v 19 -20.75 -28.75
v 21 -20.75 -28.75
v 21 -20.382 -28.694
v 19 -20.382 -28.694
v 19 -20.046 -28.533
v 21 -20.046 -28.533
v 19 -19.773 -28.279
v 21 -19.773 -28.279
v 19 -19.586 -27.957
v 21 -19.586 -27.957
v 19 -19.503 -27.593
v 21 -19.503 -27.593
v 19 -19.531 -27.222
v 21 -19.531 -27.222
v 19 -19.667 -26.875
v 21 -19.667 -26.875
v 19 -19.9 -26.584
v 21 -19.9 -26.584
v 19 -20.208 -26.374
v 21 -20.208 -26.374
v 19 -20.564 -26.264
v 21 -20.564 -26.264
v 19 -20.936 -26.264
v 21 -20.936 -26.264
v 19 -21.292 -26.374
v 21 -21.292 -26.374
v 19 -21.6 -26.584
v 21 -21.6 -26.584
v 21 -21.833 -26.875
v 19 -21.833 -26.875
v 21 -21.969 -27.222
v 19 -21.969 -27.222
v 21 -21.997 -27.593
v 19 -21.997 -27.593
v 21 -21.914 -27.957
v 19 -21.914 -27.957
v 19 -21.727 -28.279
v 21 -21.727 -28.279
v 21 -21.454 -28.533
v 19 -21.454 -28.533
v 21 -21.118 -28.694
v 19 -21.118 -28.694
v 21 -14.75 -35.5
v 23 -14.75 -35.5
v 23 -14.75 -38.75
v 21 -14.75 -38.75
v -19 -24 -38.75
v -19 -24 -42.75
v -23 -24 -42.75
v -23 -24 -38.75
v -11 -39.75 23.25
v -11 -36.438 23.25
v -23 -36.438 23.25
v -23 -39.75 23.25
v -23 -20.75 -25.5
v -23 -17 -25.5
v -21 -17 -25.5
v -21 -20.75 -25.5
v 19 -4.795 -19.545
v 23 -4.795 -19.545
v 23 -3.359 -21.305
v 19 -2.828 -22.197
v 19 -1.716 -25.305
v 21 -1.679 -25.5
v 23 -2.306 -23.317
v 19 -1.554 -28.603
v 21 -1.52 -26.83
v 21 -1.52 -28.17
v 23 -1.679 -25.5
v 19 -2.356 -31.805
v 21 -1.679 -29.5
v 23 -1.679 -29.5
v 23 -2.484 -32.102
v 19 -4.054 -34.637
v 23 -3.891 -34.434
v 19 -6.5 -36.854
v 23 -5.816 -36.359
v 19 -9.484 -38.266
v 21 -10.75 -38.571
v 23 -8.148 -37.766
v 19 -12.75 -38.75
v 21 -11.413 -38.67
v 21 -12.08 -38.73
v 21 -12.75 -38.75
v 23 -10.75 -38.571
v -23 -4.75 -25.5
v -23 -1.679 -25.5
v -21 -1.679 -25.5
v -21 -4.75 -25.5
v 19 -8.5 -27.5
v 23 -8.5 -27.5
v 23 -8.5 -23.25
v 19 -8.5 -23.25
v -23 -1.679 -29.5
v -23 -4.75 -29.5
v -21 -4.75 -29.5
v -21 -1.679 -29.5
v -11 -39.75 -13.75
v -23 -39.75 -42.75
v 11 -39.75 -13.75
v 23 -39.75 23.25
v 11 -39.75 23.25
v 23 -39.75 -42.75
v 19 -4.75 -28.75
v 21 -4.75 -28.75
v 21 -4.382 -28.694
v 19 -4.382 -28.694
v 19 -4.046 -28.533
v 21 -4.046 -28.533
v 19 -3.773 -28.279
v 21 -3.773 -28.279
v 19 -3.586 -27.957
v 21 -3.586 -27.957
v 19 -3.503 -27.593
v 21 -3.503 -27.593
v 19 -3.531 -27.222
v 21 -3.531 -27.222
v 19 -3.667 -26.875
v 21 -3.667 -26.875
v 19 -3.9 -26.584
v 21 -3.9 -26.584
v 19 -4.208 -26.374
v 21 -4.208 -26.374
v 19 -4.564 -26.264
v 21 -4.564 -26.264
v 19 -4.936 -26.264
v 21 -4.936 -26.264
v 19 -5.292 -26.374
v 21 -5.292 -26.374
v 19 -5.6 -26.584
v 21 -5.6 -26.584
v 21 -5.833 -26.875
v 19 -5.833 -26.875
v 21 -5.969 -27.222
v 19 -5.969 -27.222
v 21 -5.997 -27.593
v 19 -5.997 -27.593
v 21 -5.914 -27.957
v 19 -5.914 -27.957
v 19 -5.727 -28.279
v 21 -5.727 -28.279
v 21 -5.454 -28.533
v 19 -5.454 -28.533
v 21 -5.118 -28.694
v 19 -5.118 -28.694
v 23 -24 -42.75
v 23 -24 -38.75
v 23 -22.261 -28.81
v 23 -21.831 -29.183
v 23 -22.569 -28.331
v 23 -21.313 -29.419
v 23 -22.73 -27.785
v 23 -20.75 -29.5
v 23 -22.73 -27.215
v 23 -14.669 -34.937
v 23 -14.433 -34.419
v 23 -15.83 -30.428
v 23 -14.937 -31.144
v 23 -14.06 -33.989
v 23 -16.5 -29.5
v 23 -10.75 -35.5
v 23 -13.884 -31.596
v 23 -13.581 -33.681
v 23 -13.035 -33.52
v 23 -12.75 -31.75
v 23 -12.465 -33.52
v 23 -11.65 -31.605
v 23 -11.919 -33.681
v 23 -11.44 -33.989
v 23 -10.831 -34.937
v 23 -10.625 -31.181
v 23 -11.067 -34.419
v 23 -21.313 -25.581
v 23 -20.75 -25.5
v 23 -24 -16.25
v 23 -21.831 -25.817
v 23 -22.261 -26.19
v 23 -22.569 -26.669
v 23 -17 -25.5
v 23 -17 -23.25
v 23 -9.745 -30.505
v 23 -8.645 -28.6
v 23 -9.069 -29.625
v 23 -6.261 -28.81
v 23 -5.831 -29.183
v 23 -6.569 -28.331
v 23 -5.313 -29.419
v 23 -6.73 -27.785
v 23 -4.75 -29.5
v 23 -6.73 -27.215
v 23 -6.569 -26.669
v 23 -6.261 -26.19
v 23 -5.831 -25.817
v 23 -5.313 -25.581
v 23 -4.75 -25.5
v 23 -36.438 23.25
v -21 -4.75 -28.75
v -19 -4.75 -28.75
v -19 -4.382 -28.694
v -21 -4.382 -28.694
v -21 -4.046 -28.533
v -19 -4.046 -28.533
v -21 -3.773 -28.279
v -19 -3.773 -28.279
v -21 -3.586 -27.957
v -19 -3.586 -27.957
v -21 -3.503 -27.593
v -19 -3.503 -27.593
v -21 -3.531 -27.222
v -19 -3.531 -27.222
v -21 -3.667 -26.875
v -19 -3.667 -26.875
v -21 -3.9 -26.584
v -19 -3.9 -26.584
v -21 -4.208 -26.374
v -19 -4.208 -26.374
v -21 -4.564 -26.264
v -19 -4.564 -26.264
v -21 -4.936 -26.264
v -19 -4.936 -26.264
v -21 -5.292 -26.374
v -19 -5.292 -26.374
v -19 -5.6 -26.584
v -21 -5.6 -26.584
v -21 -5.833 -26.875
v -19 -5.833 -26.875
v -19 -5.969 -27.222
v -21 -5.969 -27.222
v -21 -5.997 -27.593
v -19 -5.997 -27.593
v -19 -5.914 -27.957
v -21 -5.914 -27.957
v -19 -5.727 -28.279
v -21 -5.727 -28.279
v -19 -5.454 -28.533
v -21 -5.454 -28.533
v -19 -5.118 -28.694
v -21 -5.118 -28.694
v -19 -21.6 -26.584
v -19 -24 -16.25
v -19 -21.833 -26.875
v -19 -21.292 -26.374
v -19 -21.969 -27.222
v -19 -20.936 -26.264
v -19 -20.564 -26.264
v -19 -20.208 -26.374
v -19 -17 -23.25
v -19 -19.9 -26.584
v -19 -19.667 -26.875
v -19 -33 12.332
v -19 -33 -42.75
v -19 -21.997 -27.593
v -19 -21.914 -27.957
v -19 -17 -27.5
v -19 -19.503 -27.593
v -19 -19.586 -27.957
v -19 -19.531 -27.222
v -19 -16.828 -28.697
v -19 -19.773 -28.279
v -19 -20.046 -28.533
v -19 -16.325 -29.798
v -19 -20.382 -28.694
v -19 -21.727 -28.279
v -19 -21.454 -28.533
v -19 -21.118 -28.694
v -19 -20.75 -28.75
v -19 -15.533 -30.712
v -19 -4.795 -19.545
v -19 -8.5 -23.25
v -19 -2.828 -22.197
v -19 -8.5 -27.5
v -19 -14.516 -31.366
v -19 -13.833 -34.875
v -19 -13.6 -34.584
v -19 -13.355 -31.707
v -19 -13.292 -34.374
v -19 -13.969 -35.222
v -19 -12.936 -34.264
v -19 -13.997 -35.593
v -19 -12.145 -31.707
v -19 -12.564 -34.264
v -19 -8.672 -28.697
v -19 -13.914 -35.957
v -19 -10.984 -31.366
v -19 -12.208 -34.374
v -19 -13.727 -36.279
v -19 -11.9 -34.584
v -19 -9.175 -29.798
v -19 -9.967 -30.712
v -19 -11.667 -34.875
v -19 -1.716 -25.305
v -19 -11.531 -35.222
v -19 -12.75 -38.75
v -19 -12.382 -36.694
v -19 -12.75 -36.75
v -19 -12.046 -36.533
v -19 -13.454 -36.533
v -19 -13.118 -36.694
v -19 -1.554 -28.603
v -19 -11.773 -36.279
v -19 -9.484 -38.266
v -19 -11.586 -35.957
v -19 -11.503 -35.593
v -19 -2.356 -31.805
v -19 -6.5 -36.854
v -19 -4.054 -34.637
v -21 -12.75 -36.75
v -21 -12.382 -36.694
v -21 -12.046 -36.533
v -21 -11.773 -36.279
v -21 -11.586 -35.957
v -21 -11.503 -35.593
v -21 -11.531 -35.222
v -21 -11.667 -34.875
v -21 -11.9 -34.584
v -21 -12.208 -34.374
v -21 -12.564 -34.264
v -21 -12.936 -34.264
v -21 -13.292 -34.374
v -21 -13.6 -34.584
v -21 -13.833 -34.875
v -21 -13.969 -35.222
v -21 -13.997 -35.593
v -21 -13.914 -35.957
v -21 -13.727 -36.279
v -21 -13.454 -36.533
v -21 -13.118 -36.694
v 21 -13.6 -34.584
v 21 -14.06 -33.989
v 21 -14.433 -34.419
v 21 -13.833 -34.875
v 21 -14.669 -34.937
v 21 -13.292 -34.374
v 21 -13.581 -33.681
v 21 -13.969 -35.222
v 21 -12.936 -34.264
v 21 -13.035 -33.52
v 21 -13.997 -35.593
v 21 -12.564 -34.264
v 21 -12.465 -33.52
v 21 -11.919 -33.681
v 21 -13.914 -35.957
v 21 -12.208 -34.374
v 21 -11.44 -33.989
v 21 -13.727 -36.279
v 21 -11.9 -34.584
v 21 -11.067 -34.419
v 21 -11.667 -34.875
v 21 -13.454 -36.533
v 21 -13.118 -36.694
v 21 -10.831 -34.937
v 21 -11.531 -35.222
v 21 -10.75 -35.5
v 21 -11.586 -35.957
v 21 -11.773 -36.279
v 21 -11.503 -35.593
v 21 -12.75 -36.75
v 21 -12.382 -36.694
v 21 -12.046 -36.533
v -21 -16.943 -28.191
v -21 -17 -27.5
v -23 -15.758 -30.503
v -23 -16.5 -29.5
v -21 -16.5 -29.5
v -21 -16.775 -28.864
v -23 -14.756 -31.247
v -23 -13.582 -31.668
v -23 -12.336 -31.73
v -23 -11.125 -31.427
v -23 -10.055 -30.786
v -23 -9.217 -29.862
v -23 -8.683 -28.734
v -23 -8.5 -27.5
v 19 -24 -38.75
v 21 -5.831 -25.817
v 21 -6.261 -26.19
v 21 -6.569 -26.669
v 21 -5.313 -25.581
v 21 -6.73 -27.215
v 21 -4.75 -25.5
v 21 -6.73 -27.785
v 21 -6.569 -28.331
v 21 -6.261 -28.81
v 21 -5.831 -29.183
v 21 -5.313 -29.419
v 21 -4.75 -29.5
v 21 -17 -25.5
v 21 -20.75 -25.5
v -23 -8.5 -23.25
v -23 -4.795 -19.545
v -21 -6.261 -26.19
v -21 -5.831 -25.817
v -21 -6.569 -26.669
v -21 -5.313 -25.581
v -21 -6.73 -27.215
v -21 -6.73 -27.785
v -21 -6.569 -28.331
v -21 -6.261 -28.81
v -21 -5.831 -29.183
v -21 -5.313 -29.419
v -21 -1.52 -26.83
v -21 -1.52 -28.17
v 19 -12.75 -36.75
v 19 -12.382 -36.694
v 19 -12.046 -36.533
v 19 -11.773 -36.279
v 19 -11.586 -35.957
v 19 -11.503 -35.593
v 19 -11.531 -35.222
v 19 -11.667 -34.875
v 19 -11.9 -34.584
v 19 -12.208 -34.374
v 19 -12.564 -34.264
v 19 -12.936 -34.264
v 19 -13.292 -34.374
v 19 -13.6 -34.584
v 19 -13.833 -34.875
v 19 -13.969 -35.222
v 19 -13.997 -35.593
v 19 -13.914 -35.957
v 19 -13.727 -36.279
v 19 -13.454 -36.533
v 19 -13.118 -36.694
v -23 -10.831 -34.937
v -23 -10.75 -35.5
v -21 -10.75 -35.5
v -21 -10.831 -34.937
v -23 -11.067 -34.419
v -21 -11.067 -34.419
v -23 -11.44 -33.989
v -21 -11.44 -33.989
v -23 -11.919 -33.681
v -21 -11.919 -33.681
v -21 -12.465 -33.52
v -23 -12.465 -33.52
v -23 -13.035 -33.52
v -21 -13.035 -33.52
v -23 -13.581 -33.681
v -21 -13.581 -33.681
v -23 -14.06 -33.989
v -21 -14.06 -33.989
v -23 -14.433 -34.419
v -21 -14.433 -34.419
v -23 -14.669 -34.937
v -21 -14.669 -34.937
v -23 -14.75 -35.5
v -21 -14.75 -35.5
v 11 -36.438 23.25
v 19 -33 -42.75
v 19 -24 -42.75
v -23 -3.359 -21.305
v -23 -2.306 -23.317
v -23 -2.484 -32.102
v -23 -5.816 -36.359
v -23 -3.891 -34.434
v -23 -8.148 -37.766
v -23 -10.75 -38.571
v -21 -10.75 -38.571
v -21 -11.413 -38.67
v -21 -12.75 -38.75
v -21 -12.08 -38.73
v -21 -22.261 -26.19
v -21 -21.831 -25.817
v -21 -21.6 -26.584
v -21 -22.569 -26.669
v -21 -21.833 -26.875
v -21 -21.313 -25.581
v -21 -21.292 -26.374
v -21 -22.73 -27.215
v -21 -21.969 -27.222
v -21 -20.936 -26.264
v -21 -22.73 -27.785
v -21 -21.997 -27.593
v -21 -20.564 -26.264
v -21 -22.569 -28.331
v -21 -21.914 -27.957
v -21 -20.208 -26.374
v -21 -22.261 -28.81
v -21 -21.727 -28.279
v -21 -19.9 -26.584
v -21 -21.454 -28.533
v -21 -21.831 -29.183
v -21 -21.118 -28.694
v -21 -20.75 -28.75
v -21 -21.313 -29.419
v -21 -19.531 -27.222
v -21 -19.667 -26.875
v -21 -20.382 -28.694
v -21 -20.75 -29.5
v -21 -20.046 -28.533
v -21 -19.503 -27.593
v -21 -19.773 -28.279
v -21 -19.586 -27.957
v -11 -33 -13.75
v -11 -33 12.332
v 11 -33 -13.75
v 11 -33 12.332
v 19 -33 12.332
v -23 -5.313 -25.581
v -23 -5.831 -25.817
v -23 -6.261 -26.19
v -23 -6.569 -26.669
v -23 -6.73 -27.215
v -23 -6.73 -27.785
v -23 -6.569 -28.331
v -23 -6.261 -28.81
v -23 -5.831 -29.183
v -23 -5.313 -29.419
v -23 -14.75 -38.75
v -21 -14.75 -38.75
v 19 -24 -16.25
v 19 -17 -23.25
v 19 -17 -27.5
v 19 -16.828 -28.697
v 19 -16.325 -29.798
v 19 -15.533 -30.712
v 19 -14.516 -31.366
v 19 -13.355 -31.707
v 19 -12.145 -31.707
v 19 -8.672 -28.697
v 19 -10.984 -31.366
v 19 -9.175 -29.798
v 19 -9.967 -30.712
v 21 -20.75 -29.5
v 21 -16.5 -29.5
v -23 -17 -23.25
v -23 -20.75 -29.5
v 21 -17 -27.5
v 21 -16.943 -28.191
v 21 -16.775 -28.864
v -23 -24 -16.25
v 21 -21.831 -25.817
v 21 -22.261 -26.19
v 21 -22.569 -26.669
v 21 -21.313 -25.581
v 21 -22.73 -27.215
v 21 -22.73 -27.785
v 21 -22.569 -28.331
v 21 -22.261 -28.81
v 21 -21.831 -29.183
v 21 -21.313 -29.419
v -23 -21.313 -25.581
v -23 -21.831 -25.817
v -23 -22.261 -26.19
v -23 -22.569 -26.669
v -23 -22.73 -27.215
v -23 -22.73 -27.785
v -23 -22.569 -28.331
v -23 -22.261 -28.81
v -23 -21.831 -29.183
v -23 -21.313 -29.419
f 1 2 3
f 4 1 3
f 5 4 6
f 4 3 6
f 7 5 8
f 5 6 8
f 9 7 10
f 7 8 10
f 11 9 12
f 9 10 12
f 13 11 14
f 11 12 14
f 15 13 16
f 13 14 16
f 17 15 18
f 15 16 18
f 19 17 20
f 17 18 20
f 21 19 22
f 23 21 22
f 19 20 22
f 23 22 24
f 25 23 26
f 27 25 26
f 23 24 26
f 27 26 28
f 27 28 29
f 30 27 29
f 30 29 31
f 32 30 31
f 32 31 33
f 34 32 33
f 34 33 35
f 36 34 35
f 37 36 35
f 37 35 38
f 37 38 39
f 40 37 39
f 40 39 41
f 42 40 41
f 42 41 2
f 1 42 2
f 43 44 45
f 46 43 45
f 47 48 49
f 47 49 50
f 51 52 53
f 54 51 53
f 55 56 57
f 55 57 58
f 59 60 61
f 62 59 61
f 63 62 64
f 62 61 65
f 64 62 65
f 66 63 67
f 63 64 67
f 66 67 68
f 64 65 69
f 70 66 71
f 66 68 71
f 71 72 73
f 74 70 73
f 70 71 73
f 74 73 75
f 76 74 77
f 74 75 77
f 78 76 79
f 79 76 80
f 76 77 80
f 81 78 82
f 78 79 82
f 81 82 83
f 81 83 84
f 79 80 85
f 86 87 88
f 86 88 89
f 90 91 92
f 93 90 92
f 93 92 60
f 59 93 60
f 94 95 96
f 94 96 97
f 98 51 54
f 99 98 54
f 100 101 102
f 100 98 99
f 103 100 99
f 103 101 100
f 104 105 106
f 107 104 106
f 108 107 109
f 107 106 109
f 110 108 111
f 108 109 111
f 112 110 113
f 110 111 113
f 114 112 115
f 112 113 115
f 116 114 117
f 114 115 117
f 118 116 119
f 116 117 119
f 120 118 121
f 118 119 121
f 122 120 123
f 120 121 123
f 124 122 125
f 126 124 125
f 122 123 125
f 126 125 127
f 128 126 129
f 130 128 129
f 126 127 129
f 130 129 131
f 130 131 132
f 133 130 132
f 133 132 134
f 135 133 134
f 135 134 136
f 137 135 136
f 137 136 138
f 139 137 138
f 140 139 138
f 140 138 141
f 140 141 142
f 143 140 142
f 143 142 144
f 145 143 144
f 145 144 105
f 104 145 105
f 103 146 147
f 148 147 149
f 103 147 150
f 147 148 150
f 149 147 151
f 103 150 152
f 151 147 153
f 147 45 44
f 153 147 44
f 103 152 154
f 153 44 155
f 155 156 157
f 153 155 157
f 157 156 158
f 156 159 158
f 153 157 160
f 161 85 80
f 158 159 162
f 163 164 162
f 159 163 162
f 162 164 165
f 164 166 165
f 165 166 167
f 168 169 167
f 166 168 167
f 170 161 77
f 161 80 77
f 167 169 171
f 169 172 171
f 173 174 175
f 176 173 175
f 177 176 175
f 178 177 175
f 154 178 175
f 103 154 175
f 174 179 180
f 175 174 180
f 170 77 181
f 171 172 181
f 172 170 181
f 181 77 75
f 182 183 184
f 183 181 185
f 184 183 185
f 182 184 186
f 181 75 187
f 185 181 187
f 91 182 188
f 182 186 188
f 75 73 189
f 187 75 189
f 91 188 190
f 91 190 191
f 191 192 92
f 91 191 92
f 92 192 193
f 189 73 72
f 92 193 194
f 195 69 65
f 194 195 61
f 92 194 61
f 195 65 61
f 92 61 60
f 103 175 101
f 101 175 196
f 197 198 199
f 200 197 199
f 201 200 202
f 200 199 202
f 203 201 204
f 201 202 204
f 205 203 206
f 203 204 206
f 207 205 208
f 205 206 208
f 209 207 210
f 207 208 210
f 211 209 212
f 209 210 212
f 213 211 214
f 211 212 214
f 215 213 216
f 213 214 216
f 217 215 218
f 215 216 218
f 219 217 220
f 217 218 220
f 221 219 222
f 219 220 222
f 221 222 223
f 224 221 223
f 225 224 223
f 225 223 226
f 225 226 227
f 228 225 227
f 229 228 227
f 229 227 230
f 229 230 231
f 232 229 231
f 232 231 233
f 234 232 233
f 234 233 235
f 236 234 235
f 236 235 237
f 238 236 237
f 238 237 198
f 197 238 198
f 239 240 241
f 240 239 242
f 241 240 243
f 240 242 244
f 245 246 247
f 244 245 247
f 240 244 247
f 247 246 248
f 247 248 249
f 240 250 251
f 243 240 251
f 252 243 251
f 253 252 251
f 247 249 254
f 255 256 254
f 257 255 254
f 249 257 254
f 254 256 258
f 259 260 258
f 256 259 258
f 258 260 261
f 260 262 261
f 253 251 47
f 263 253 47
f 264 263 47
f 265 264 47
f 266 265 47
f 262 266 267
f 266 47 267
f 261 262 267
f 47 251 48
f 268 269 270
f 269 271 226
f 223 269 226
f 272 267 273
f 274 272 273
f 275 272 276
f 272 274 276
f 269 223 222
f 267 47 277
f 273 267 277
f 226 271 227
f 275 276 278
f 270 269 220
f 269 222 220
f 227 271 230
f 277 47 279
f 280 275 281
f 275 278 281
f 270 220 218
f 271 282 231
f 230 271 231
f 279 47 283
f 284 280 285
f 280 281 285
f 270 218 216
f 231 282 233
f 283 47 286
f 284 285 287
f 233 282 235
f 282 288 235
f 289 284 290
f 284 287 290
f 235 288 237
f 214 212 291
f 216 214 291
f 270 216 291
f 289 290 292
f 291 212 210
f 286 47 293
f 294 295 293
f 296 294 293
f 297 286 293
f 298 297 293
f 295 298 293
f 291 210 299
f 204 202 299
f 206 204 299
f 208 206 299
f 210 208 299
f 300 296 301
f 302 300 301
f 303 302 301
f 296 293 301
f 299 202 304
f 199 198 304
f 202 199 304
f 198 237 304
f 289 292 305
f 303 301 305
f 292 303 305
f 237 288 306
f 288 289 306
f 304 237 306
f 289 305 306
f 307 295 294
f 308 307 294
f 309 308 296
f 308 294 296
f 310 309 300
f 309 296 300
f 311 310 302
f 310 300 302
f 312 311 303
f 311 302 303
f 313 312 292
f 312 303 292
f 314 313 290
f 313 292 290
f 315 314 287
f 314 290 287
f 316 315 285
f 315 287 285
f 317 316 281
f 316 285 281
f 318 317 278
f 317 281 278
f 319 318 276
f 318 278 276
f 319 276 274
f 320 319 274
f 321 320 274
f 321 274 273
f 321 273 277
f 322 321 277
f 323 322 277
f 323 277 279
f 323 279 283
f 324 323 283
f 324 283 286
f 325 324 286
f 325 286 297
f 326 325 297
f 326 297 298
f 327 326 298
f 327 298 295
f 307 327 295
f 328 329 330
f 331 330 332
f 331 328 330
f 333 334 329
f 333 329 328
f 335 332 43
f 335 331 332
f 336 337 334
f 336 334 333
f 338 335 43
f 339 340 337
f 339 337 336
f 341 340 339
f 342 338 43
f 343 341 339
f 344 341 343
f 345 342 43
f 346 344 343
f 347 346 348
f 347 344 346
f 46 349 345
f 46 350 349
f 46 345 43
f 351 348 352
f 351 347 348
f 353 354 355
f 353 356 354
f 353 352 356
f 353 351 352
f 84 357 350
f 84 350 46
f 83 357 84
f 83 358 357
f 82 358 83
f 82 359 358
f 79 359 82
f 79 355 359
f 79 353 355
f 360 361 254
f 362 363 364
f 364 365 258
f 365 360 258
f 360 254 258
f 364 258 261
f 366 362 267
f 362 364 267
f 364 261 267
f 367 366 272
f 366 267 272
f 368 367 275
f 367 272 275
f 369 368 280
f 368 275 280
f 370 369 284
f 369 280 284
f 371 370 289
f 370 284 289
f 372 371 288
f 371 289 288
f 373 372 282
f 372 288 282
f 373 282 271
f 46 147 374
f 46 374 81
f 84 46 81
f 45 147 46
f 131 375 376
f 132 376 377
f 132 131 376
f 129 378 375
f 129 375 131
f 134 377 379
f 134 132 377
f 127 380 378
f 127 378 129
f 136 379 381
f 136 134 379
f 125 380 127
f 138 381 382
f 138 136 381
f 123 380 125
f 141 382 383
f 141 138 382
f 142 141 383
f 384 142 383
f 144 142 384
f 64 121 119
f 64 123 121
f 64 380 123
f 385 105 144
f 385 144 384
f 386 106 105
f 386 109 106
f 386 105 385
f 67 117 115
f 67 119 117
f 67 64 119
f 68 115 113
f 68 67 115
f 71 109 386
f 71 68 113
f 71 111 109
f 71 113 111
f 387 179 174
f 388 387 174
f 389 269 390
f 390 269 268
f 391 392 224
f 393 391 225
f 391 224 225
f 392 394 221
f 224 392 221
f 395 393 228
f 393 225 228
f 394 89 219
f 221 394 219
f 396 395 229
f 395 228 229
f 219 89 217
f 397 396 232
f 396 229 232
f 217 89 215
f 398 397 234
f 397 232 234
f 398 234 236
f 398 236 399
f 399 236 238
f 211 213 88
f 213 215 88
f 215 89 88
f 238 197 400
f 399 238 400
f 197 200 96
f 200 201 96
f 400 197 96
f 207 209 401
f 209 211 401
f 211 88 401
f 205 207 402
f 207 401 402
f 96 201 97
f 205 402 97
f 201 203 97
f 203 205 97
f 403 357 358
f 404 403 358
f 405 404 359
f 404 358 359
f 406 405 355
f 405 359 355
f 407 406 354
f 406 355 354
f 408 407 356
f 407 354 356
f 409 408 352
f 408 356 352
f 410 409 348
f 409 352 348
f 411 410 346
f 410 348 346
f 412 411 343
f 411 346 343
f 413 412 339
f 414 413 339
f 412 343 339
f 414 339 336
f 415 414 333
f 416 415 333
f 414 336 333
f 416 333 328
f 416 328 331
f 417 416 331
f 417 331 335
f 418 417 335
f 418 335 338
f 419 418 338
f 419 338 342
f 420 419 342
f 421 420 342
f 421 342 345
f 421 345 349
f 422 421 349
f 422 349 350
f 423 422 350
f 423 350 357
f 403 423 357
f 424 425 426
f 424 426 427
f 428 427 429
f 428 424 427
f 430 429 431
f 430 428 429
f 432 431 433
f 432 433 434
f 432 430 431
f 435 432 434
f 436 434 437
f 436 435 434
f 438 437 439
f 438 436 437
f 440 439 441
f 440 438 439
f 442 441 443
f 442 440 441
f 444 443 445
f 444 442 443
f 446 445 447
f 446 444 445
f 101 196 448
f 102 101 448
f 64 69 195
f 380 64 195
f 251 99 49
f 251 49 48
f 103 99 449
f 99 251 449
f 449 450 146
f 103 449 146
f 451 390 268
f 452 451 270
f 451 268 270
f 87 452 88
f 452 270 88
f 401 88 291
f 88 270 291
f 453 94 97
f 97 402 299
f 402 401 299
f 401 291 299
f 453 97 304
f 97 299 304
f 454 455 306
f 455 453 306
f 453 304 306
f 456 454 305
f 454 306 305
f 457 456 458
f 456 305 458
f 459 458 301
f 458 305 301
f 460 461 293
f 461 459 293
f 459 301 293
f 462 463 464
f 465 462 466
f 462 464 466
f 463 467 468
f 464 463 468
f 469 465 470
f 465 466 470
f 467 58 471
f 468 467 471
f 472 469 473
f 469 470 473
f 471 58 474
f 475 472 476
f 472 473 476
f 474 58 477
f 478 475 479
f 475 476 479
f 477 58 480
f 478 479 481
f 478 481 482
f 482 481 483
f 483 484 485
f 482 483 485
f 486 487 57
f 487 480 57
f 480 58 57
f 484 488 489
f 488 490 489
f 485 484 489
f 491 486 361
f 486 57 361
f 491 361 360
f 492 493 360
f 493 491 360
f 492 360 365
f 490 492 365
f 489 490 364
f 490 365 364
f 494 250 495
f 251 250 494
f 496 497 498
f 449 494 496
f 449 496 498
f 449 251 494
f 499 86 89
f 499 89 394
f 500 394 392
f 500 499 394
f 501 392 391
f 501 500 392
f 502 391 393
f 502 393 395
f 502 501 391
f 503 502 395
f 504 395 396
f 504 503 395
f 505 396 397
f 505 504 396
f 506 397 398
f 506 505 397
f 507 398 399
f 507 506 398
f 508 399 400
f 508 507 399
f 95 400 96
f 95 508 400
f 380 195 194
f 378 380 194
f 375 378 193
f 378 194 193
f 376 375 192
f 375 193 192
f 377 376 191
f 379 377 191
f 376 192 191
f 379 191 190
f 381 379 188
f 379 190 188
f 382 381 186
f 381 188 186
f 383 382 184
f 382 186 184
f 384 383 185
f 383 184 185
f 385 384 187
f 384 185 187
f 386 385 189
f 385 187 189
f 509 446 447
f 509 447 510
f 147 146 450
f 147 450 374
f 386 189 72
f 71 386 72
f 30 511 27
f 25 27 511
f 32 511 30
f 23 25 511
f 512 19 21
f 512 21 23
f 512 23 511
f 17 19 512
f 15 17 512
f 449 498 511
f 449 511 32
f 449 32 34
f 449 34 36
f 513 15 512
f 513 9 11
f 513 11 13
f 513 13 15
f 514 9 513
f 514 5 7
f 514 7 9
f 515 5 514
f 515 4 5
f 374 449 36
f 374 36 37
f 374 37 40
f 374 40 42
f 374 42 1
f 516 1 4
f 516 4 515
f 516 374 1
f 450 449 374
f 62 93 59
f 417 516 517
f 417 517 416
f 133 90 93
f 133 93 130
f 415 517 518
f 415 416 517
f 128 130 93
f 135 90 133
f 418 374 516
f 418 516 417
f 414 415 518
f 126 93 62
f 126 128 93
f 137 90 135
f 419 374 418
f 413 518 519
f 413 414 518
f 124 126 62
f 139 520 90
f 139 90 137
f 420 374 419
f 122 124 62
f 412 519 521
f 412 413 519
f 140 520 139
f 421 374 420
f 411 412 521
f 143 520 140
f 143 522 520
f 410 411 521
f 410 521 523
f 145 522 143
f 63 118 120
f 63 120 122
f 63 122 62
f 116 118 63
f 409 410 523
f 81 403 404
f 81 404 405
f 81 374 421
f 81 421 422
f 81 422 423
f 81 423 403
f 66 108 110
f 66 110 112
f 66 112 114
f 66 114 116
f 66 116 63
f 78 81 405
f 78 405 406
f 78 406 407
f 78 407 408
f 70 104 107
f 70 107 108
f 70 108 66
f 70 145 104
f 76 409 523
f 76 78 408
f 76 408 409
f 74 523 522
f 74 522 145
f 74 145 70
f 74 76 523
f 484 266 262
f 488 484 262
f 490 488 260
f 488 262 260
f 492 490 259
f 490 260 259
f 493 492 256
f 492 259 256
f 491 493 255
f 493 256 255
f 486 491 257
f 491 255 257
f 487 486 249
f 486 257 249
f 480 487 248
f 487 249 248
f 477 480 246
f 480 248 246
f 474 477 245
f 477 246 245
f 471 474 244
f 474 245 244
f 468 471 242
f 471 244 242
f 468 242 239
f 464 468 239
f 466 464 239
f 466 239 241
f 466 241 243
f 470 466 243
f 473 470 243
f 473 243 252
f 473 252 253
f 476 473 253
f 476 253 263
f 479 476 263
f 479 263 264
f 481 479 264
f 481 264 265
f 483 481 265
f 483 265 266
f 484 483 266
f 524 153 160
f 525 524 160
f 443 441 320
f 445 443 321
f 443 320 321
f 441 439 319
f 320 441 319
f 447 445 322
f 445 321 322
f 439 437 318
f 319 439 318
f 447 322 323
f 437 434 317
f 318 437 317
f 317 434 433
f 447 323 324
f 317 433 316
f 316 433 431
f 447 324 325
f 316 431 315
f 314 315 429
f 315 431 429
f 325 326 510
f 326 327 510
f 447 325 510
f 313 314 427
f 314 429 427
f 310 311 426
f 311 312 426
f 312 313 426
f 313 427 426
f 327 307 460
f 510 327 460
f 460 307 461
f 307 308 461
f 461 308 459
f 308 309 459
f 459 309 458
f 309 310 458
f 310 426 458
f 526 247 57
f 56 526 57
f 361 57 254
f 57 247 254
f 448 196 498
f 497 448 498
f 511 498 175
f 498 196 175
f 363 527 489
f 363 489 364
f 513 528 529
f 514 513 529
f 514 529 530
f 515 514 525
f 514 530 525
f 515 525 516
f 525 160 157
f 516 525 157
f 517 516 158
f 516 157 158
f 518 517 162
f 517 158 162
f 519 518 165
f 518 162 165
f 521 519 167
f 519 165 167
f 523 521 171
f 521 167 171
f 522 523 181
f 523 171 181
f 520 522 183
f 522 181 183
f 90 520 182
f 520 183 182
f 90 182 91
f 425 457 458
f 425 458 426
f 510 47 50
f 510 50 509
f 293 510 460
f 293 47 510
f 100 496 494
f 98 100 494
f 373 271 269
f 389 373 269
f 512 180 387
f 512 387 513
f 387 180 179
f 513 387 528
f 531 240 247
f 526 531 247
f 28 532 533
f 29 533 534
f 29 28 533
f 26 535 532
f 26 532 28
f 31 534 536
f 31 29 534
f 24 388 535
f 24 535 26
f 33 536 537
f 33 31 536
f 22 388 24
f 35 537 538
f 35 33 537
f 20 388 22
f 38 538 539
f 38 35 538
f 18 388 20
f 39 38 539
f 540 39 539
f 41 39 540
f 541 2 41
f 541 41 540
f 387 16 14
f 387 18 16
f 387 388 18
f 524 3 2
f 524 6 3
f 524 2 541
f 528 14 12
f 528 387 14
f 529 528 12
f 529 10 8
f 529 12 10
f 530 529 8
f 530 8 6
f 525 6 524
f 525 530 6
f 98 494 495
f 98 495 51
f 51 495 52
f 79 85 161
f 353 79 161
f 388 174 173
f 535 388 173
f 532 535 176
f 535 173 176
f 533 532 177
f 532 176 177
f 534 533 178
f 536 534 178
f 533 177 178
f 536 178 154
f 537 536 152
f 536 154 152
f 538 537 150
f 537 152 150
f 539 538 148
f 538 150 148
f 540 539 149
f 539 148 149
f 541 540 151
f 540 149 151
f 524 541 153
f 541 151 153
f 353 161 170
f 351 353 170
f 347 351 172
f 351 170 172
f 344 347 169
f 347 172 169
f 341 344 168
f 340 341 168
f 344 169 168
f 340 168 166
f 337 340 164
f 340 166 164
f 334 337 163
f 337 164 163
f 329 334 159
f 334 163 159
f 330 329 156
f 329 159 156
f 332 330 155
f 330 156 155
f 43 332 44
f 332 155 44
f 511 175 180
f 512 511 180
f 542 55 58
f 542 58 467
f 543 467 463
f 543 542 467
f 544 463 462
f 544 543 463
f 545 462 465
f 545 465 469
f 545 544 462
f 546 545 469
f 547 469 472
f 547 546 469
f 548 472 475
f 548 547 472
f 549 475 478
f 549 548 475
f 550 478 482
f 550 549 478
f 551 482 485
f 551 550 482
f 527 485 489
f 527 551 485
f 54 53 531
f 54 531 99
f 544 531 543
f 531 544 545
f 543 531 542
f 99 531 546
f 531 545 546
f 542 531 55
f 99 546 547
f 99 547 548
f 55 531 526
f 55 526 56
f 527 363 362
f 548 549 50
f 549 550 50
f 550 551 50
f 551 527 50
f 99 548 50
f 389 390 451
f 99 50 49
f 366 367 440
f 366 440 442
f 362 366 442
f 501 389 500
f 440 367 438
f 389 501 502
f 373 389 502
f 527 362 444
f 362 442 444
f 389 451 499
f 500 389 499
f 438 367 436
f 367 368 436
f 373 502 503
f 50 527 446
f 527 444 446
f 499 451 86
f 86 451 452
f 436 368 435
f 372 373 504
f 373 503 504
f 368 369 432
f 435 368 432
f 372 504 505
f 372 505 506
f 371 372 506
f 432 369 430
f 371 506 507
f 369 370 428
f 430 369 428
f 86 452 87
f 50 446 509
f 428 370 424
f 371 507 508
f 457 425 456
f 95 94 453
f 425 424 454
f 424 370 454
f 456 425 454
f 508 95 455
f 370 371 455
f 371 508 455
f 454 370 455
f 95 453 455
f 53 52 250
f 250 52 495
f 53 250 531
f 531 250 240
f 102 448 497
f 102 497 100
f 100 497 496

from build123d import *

# Parameters (mm, degrees)
SKETCH1_W                = 50
SKETCH1_H                = 170
BOSS_EXTRUDE1_DEPTH      = 55
SKETCH2_W                = 34
SKETCH2_H                = 27
CUT_EXTRUDE1_DEPTH       = 181.416185527
SKETCH3_W                = 10
SKETCH3_H                = 24
SKETCH3_R                = 4.25
SKETCH3_R_2              = 1
CUT_EXTRUDE2_DEPTH       = 186.539753153
SKETCH4_W                = 2
SKETCH4_H                = 24
CUT_EXTRUDE3_DEPTH       = 178.623196683
SKETCH5_W                = 6.25
SKETCH5_H                = 11.25
CUT_EXTRUDE4_DEPTH       = 186.539753153
SKETCH6_W                = 38
SKETCH6_H                = 10
CUT_EXTRUDE5_DEPTH       = 181.416185527
SKETCH8_W                = 13.25
SKETCH8_H                = 2.25
CUT_EXTRUDE7_DEPTH       = 186.539753153
SKETCH9_W                = 34
SKETCH9_H                = 35.25
CUT_EXTRUDE8_DEPTH       = 179.297679458
SKETCH11_W               = 13.25
SKETCH11_H               = 20.25
CUT_EXTRUDE9_DEPTH       = 184.480414486
SKETCH12_W               = 28.5
SKETCH12_H               = 15
BOSS_EXTRUDE2_DEPTH      = 8
SKETCH14_W               = 34
SKETCH14_H               = 15
SKETCH14_H_2             = 10.25
BOSS_EXTRUDE3_DEPTH      = 13.25
SKETCH16_R               = 4.5
SKETCH16_R_2             = 2.5
CUT_EXTRUDE13_DEPTH      = 8
SKETCH17_R               = 4.5
SKETCH17_W               = 55
SKETCH17_H               = 10.25
CUT_EXTRUDE15_DEPTH      = 175.384811552
SKETCH18_W               = 71.25
SKETCH18_H               = 27.5
SKETCH18_W_2             = 13.75
SKETCH18_W_3             = 16.25
BOSS_EXTRUDE4_DEPTH      = 50
SKETCH19_W               = 38
SKETCH19_H               = 7
CUT_EXTRUDE16_DEPTH      = 152.25227271
SKETCH20_W               = 57.5
SKETCH20_H               = 27.5
CUT_EXTRUDE17_DEPTH      = 102.137591923
CUT_EXTRUDE18_DEPTH      = 100.39221549
SKETCH22_W               = 82.5
SKETCH22_H               = 2.5
BOSS_EXTRUDE5_DEPTH      = 50
SKETCH24_W               = 22
SKETCH24_H               = 17
CUT_EXTRUDE19_DEPTH      = 101.710289941
SKETCH25_W               = 38
SKETCH25_H               = 38.136363636
CUT_EXTRUDE20_DEPTH      = 10
SKETCH27_W               = 38
SKETCH27_H               = 60.136363636
BOSS_EXTRUDE6_DEPTH      = 8.6
SKETCH29_W               = 38
SKETCH29_H               = 1.4
CUT_EXTRUDE21_DEPTH      = 85.601313414
BOSS_EXTRUDE7_DEPTH      = 50
SKETCH31_W               = 38
SKETCH31_H               = 17
CUT_EXTRUDE22_DEPTH      = 117.365802537
SKETCH32_W               = 100
SKETCH32_H               = 3
CUT_EXTRUDE23_DEPTH      = 101.710289941
SKETCH33_W               = 20
SKETCH33_H               = 10
SKETCH33_W_2             = 22
SKETCH33_H_2             = 45
CUT_EXTRUDE24_DEPTH      = 84.137311118
SKETCH34_W               = 8
SKETCH34_H               = 12
CUT_EXTRUDE25_DEPTH      = 76.0787087
BOSS_EXTRUDE8_DEPTH      = 8
SKETCH37_W               = 78
SKETCH37_H               = 9
SKETCH37_W_2             = 12
CUT_EXTRUDE27_DEPTH      = 93.48006542
FILLET1_R                = 10
CUT_EXTRUDE29_DEPTH      = 77.423572934
CUT_EXTRUDE29_DEPTH_BACK = 77.423572934
SKETCH38_W               = 2
SKETCH38_H               = 78
SKETCH38_W_2             = 46
SKETCH38_H_2             = 8
SKETCH39_W               = 22.223383748
SKETCH39_H               = 19.441332461
CUT_EXTRUDE30_DEPTH      = 86.624543794
BOSS_EXTRUDE9_DEPTH      = 0.75
CUT_EXTRUDE31_DEPTH      = 76.967920861
SKETCH44_R               = 1.25
CUT_EXTRUDE32_DEPTH      = 76.967920861
SKETCH45_R               = 1.25
CUT_EXTRUDE33_DEPTH      = 2
CUT_EXTRUDE34_DEPTH      = 76.967920861
SKETCH48_W               = 66
SKETCH48_H               = 3
CUT_EXTRUDE35_DEPTH      = 76.967920861


with BuildPart() as part:
    # Sketch1 → Boss-Extrude1 (new body)
    with BuildSketch(Plane.XY):
        with Locations((0, -85)):
            Rectangle(SKETCH1_W, SKETCH1_H)
    extrude(amount=-BOSS_EXTRUDE1_DEPTH)

    # Sketch2 → Cut-Extrude1 (cut, through all)
    with BuildSketch(Plane.XY):
        with Locations((0, -13.5)):
            Rectangle(SKETCH2_W, SKETCH2_H)
    extrude(amount=-CUT_EXTRUDE1_DEPTH, mode=Mode.SUBTRACT)

    # Sketch3 → Cut-Extrude2 (cut, through all)
    with BuildSketch(Plane(origin=(25, 0, 0), x_dir=(0, 0, -1), z_dir=(1, 0, 0))):
        with Locations((50, -12)):
            Rectangle(SKETCH3_W, SKETCH3_H)
        with Locations((5, -12)):
            Rectangle(SKETCH3_W, SKETCH3_H)
        with Locations(Location((27.5, -12.75, 0), (0, 0, 90))):
            Circle(SKETCH3_R)
        with Locations(Location((35.5, -12.75, 0), (0, 0, 90))):
            Circle(SKETCH3_R_2)
        with Locations(Location((27.5, -4.75, 0), (0, 0, 90))):
            Circle(SKETCH3_R_2)
        with Locations(Location((27.5, -20.75, 0), (0, 0, 90))):
            Circle(SKETCH3_R_2)
        with Locations(Location((19.5, -12.75, 0), (0, 0, 90))):
            Circle(SKETCH3_R_2)
    extrude(amount=-CUT_EXTRUDE2_DEPTH, mode=Mode.SUBTRACT)

    # Sketch4 → Cut-Extrude3 (cut, through all)
    with BuildSketch(Plane.XY.offset(-10)):
        with Locations((-18, -12)):
            Rectangle(SKETCH4_W, SKETCH4_H)
        with Locations((18, -12)):
            Rectangle(SKETCH4_W, SKETCH4_H)
    extrude(amount=-CUT_EXTRUDE3_DEPTH, mode=Mode.SUBTRACT)

    # Sketch5 → Cut-Extrude4 (cut, through all)
    with BuildSketch(Plane(origin=(25, 0, 0), x_dir=(0, 0, -1), z_dir=(1, 0, 0))):
        with BuildLine():
            Line((45, 0), (10, 0))
            Line((10, 0), (10, -12.75))
            Line((10, -12.75), (16.25, -12.75))
            ThreePointArc((16.25, -12.75), (27.5, -1.5), (38.75, -12.75))
            Line((38.75, -12.75), (45, -12.75))
            Line((45, -12.75), (45, 0))
        make_face()
        with Locations((13.125, -18.375)):
            Rectangle(SKETCH5_W, SKETCH5_H)
        with Locations((41.875, -18.375)):
            Rectangle(SKETCH5_W, SKETCH5_H)
    extrude(amount=-CUT_EXTRUDE4_DEPTH, mode=Mode.SUBTRACT)

    # Sketch6 → Cut-Extrude5 (cut, through all)
    with BuildSketch(Plane.XY):
        with Locations((0, -29)):
            Rectangle(SKETCH6_W, SKETCH6_H)
    extrude(amount=-CUT_EXTRUDE5_DEPTH, mode=Mode.SUBTRACT)

    # Sketch8 → Cut-Extrude7 (cut, through all)
    with BuildSketch(Plane(origin=(25, 0, 0), x_dir=(0, 0, -1), z_dir=(1, 0, 0))):
        with BuildLine():
            Line((27.5, -157.5), (27.5, -132.5))
            Line((27.5, -132.5), (13.25, -132.5))
            Line((13.25, -132.5), (13.25, -167.75))
            Line((13.25, -167.75), (17.25, -167.75))
            ThreePointArc((17.25, -167.75), (20.252155493, -160.502155493), (27.5, -157.5))
        make_face()
        with BuildLine():
            Line((41.75, -167.75), (41.75, -132.5))
            Line((41.75, -132.5), (27.5, -132.5))
            Line((27.5, -132.5), (27.5, -157.5))
            ThreePointArc((27.5, -157.5), (34.747844507, -160.502155493), (37.75, -167.75))
            Line((37.75, -167.75), (41.75, -167.75))
        make_face()
        with Locations((48.375, -168.875)):
            Rectangle(SKETCH8_W, SKETCH8_H)
        with Locations((6.625, -168.875)):
            Rectangle(SKETCH8_W, SKETCH8_H)
        with BuildLine():
            Line((17.25, -167.75), (13.25, -167.75))
            Line((13.25, -167.75), (13.25, -170))
            Line((13.25, -170), (17.5, -170))
            ThreePointArc((17.5, -170), (17.31269172, -168.881923142), (17.25, -167.75))
        make_face()
        with BuildLine():
            Line((41.75, -170), (41.75, -167.75))
            Line((41.75, -167.75), (37.75, -167.75))
            ThreePointArc((37.75, -167.75), (37.68730828, -168.881923142), (37.5, -170))
            Line((37.5, -170), (41.75, -170))
        make_face()
        with BuildLine():
            Line((27.5, -167.75), (27.5, -157.5))
            ThreePointArc((27.5, -157.5), (20.252155493, -160.502155493), (17.25, -167.75))
            Line((17.25, -167.75), (27.5, -167.75))
        make_face()
        with BuildLine():
            ThreePointArc((37.75, -167.75), (34.747844507, -160.502155493), (27.5, -157.5))
            Line((27.5, -157.5), (27.5, -167.75))
            Line((27.5, -167.75), (37.75, -167.75))
        make_face()
        with BuildLine():
            Line((27.5, -170), (27.5, -167.75))
            Line((27.5, -167.75), (17.25, -167.75))
            ThreePointArc((17.25, -167.75), (17.31269172, -168.881923142), (17.5, -170))
            Line((17.5, -170), (27.5, -170))
        make_face()
        with BuildLine():
            ThreePointArc((37.5, -170), (37.68730828, -168.881923142), (37.75, -167.75))
            Line((37.75, -167.75), (27.5, -167.75))
            Line((27.5, -167.75), (27.5, -170))
            Line((27.5, -170), (37.5, -170))
        make_face()
    extrude(amount=-CUT_EXTRUDE7_DEPTH, mode=Mode.SUBTRACT)

    # Sketch9 → Cut-Extrude8 (cut, through all)
    with BuildSketch(Plane.XY):
        with Locations((0, -150.125)):
            Rectangle(SKETCH9_W, SKETCH9_H)
    extrude(amount=-CUT_EXTRUDE8_DEPTH, mode=Mode.SUBTRACT)

    # Sketch11 → Cut-Extrude9 (cut, through all)
    with BuildSketch(Plane(origin=(25, 0, 0), x_dir=(0, 0, -1), z_dir=(1, 0, 0))):
        with BuildLine():
            ThreePointArc((17.25, -167.75), (20.252155493, -160.502155493), (27.5, -157.5))
            Line((27.5, -157.5), (27.5, -147.5))
            Line((27.5, -147.5), (13.25, -147.5))
            Line((13.25, -147.5), (13.25, -167.75))
            Line((13.25, -167.75), (17.25, -167.75))
        make_face()
        with BuildLine():
            Line((27.5, -147.5), (27.5, -157.5))
            ThreePointArc((27.5, -157.5), (34.747844507, -160.502155493), (37.75, -167.75))
            Line((37.75, -167.75), (41.75, -167.75))
            Line((41.75, -167.75), (41.75, -147.5))
            Line((41.75, -147.5), (27.5, -147.5))
        make_face()
        with Locations((48.375, -157.625)):
            Rectangle(SKETCH11_W, SKETCH11_H)
        with Locations((6.625, -157.625)):
            Rectangle(SKETCH11_W, SKETCH11_H)
    extrude(amount=-CUT_EXTRUDE9_DEPTH, mode=Mode.SUBTRACT)

    # Sketch12 → Boss-Extrude2 (add)
    with BuildSketch(Plane(origin=(25, 0, 0), x_dir=(0, 0, -1), z_dir=(1, 0, 0))):
        with Locations((27.5, -140)):
            Rectangle(SKETCH12_W, SKETCH12_H)
    boss_extrude2 = extrude(amount=-BOSS_EXTRUDE2_DEPTH)

    # Mirror1: Boss-Extrude2 across plane
    add(boss_extrude2.mirror(Plane(origin=(0, 0, 0), x_dir=(0, 0, 1), z_dir=(1, 0, 0))))

    # Sketch14 → Boss-Extrude3 (add)
    with BuildSketch(Plane.XY):
        with Locations((0, -140)):
            Rectangle(SKETCH14_W, SKETCH14_H)
        with Locations((0, -152.625)):
            Rectangle(SKETCH14_W, SKETCH14_H_2)
    boss_extrude3 = extrude(amount=-BOSS_EXTRUDE3_DEPTH)

    # Mirror2: Boss-Extrude3 across plane
    add(boss_extrude3.mirror(Plane.XY.offset(-27.5)))

    # Sketch16 → Cut-Extrude13 (cut)
    # profile 1 of 3: a face of its own
    with BuildSketch(Plane(origin=(25, 0, 0), x_dir=(0, 0, -1), z_dir=(1, 0, 0))):
        with Locations(Location((16.5, -135.75, 0), (0, 0, 90))):
            Circle(SKETCH16_R)
        with Locations((16.5, -135.75)):
            Circle(SKETCH16_R_2, mode=Mode.SUBTRACT)
    # profile 2 of 3: a face of its own
    with BuildSketch(Plane(origin=(25, 0, 0), x_dir=(0, 0, -1), z_dir=(1, 0, 0))):
        with Locations((16.5, -135.75)):
            Circle(SKETCH16_R_2)
    # profile 3 of 3: a face of its own
    with BuildSketch(Plane(origin=(25, 0, 0), x_dir=(0, 0, -1), z_dir=(1, 0, 0))):
        with Locations(Location((38.5, -135.75, 0), (0, 0, 90))):
            Circle(SKETCH16_R)
    cut_extrude13 = extrude(amount=-CUT_EXTRUDE13_DEPTH, mode=Mode.SUBTRACT)

    # Mirror3: Cut-Extrude13 across plane
    add(cut_extrude13.mirror(Plane(origin=(0, 0, 0), x_dir=(0, 0, 1), z_dir=(1, 0, 0))), mode=Mode.SUBTRACT)

    # Sketch17 → Cut-Extrude15 (cut, through all)
    # profile 1 of 4: a face of its own
    with BuildSketch(Plane(origin=(25, 0, 0), x_dir=(0, 0, -1), z_dir=(1, 0, 0))):
        Polygon((55, -51.5), (27.5, -51.5), (0, -51.5), (0, -147.5), (55, -147.5), align=None)
        with Locations((16.5, -135.75)):
            Circle(SKETCH17_R, mode=Mode.SUBTRACT)
        with Locations((38.5, -135.75)):
            Circle(SKETCH17_R, mode=Mode.SUBTRACT)
    # profile 2 of 4: a face of its own
    with BuildSketch(Plane(origin=(25, 0, 0), x_dir=(0, 0, -1), z_dir=(1, 0, 0))):
        with Locations((27.5, -152.625)):
            Rectangle(SKETCH17_W, SKETCH17_H)
    # profile 3 of 4: a face of its own
    with BuildSketch(Plane(origin=(25, 0, 0), x_dir=(0, 0, -1), z_dir=(1, 0, 0))):
        with Locations((38.5, -135.75)):
            Circle(SKETCH17_R)
    # profile 4 of 4: a face of its own
    with BuildSketch(Plane(origin=(25, 0, 0), x_dir=(0, 0, -1), z_dir=(1, 0, 0))):
        with Locations((16.5, -135.75)):
            Circle(SKETCH17_R)
    extrude(amount=-CUT_EXTRUDE15_DEPTH, mode=Mode.SUBTRACT)

    # Sketch18 → Boss-Extrude4 (add)
    with BuildSketch(Plane(origin=(25, 0, 0), x_dir=(0, 0, -1), z_dir=(1, 0, 0))):
        with Locations((-35.625, -37.75)):
            Rectangle(SKETCH18_W, SKETCH18_H)
        with Locations((61.875, -37.75)):
            Rectangle(SKETCH18_W_2, SKETCH18_H)
        Polygon((38.75, -51.5), (38.75, -24), (16.25, -24), (0, -24), (0, -51.5), align=None)
        with Locations((46.875, -37.75)):
            Rectangle(SKETCH18_W_3, SKETCH18_H)
    extrude(amount=-BOSS_EXTRUDE4_DEPTH)

    # Sketch19 → Cut-Extrude16 (cut, through all)
    with BuildSketch(Plane.XY.offset(71.25)):
        with Locations((0, -27.5)):
            Rectangle(SKETCH19_W, SKETCH19_H)
    extrude(amount=-CUT_EXTRUDE16_DEPTH, mode=Mode.SUBTRACT)

    # Sketch20 → Cut-Extrude17 (cut, through all)
    with BuildSketch(Plane(origin=(25, 0, 0), x_dir=(0, 0, -1), z_dir=(1, 0, 0))):
        with Locations((-42.5, -37.75)):
            Rectangle(SKETCH20_W, SKETCH20_H)
    extrude(amount=-CUT_EXTRUDE17_DEPTH, mode=Mode.SUBTRACT)

    # Sketch21 → Cut-Extrude18 (cut, through all)
    with BuildSketch(Plane(origin=(25, 0, 0), x_dir=(0, 0, -1), z_dir=(1, 0, 0))):
        Polygon((16.25, -24), (-13.75, -51.5), (-13.75, -24), align=None)
    extrude(amount=-CUT_EXTRUDE18_DEPTH, mode=Mode.SUBTRACT)

    # Sketch22 → Boss-Extrude5 (add)
    with BuildSketch(Plane(origin=(25, 0, 0), x_dir=(0, 0, -1), z_dir=(1, 0, 0))):
        with Locations((27.5, -52.75)):
            Rectangle(SKETCH22_W, SKETCH22_H)
    extrude(amount=-BOSS_EXTRUDE5_DEPTH)

    # Sketch24 → Cut-Extrude19 (cut, through all)
    with BuildSketch(Plane(origin=(25, 0, 0), x_dir=(0, 0, -1), z_dir=(1, 0, 0))):
        with Locations((57.75, -32.5)):
            Rectangle(SKETCH24_W, SKETCH24_H)
    extrude(amount=-CUT_EXTRUDE19_DEPTH, mode=Mode.SUBTRACT)

    # Sketch25 → Cut-Extrude20 (cut)
    with BuildSketch(Plane(origin=(0, -31, 0), x_dir=(1, 0, 0), z_dir=(0, 1, 0))):
        with Locations((0, 27.681818182)):
            Rectangle(SKETCH25_W, SKETCH25_H)
    extrude(amount=-CUT_EXTRUDE20_DEPTH, mode=Mode.SUBTRACT)

    # Sketch27 → Boss-Extrude6 (add)
    with BuildSketch(Plane(origin=(0, -41, 0), x_dir=(1, 0, 0), z_dir=(0, 1, 0))):
        with Locations((0, 38.681818182)):
            Rectangle(SKETCH27_W, SKETCH27_H)
    extrude(amount=BOSS_EXTRUDE6_DEPTH)

    # Sketch29 → Cut-Extrude21 (cut, through all)
    with BuildSketch(Plane(origin=(0, 0, -8.613636364), x_dir=(-1, 0, 0), z_dir=(0, 0, -1))):
        with Locations((0, -31.7)):
            Rectangle(SKETCH29_W, SKETCH29_H)
    extrude(amount=-CUT_EXTRUDE21_DEPTH, mode=Mode.SUBTRACT)

    # Sketch30 → Boss-Extrude7 (add)
    with BuildSketch(Plane.ZY.offset(25)):
        Polygon((31.25, -38.957214173), (-16.25, -24), (-7.086363636, -32.4), (13.75, -51.5), (13.75, -53.914428346), (31.25, -53.914428346), align=None)
        Polygon((-16.25, -24), (-16.25, -32.4), (-7.086363636, -32.4), align=None)
    extrude(amount=-BOSS_EXTRUDE7_DEPTH)

    # Sketch31 → Cut-Extrude22 (cut, through all)
    with BuildSketch(Plane(origin=(0, 0, -68.75), x_dir=(-1, 0, 0), z_dir=(0, 0, -1))):
        with Locations((0, -32.5)):
            Rectangle(SKETCH31_W, SKETCH31_H)
    extrude(amount=-CUT_EXTRUDE22_DEPTH, mode=Mode.SUBTRACT)

    # Sketch32 → Cut-Extrude23 (cut, through all)
    with BuildSketch(Plane(origin=(25, 0, 0), x_dir=(0, 0, -1), z_dir=(1, 0, 0))):
        with Locations((18.75, -52.5)):
            Rectangle(SKETCH32_W, SKETCH32_H)
    extrude(amount=-CUT_EXTRUDE23_DEPTH, mode=Mode.SUBTRACT)

    # Sketch33 → Cut-Extrude24 (cut, through all)
    with BuildSketch(Plane(origin=(0, -41, 0), x_dir=(1, 0, 0), z_dir=(0, 1, 0))):
        Polygon((-10, 68.75), (-25, 68.75), (-25, 46.75), (-19, 46.75), (-10, 46.75), (-10, 58.75), align=None)
        Polygon((25, 68.75), (10, 68.75), (10, 58.75), (10, 46.75), (19, 46.75), (25, 46.75), align=None)
        with Locations((0, 63.75)):
            Rectangle(SKETCH33_W, SKETCH33_H)
        with Locations((0, -8.75)):
            Rectangle(SKETCH33_W_2, SKETCH33_H_2)
    extrude(amount=-CUT_EXTRUDE24_DEPTH, mode=Mode.SUBTRACT)

    # Sketch34 → Cut-Extrude25 (cut, through all)
    with BuildSketch(Plane(origin=(0, -41, 0), x_dir=(1, 0, 0), z_dir=(0, 1, 0))):
        with Locations((0, 52.75)):
            Rectangle(SKETCH34_W, SKETCH34_H)
    extrude(amount=-CUT_EXTRUDE25_DEPTH, mode=Mode.SUBTRACT)

    # Sketch36 → Boss-Extrude8 (add)
    with BuildSketch(Plane(origin=(0, -41, 0), x_dir=(1, 0, 0), z_dir=(0, 1, 0))):
        Polygon((4, 58.75), (4, 46.75), (-4, 46.75), (-4, 58.75), (-10, 58.75), (-10, 46.75), (-19, 46.75), (-19, -31.25), (-11, -31.25), (-11, 13.75), (11, 13.75), (11, -31.25), (19, -31.25), (19, 46.75), (10, 46.75), (10, 58.75), align=None)
    extrude(amount=BOSS_EXTRUDE8_DEPTH)

    # Sketch37 → Cut-Extrude27 (cut, through all)
    with BuildSketch(Plane(origin=(25, 0, 0), x_dir=(0, 0, -1), z_dir=(1, 0, 0))):
        with Locations((7.75, -46.5)):
            Rectangle(SKETCH37_W, SKETCH37_H)
        Polygon((-31.25, -33), (-31.25, -38.957214173), (-12.331525614, -33), align=None)
        with Locations((52.75, -46.5)):
            Rectangle(SKETCH37_W_2, SKETCH37_H)
    extrude(amount=-CUT_EXTRUDE27_DEPTH, mode=Mode.SUBTRACT)

    # Fillet1
    # the kernel refuses this fillet: 10 mm, written as the material it takes off along each edge
    with BuildSketch(Plane(origin=(20.874685928, -42, -58.75), x_dir=(0, 0, 1), z_dir=(-1, 0, 0)), Plane(origin=(34.874685928, -42, -58.75), x_dir=(0, 0, 1), z_dir=(-1, 0, 0))) as fillet1_piece_1:
        with BuildLine():
            CenterArc((9.949874371, 10), FILLET1_R, 185.739170477, 84.260829523)
            Line((0, 9), (-0.198997487, 8.98))
            ThreePointArc((-0.198997487, 8.98), (-0.2, 4.5), (-0.2, 0))
            Line((-0.2, 0), (0, -0.2))
            Line((0, -0.2), (9.949874371, -0.2))
            Line((9.949874371, -0.2), (9.949874371, 0))
        make_face()
    extrude(amount=55.749371855, mode=Mode.SUBTRACT)

    # Sketch38 → Cut-Extrude29 (cut, two sides: drawn at the far end of the back side and taken through both)
    with BuildSketch(Plane(origin=(0, 0, 0), x_dir=(1, 0, 0), z_dir=(0, 1, 0)).offset(-CUT_EXTRUDE29_DEPTH_BACK)):
        with Locations((-24, 7.75)):
            Rectangle(SKETCH38_W, SKETCH38_H)
        with Locations((24, 7.75)):
            Rectangle(SKETCH38_W, SKETCH38_H)
        with Locations((0, -27.25)):
            Rectangle(SKETCH38_W_2, SKETCH38_H_2)
    extrude(amount=CUT_EXTRUDE29_DEPTH + CUT_EXTRUDE29_DEPTH_BACK, mode=Mode.SUBTRACT)

    # Sketch39 → Cut-Extrude30 (cut, through all)
    with BuildSketch(Plane(origin=(23, 0, 0), x_dir=(0, 0, -1), z_dir=(1, 0, 0))):
        with Locations((53.861691874, -33.720666231)):
            Rectangle(SKETCH39_W, SKETCH39_H)
    extrude(amount=-CUT_EXTRUDE30_DEPTH, mode=Mode.SUBTRACT)

    # Sketch41 → Boss-Extrude9 (add)
    with BuildSketch(Plane.XZ.offset(42)):
        Polygon((-11, 23.25), (-23, 23.25), (-23, -42.75), (23, -42.75), (23, 23.25), (11, 23.25), (11, -13.75), (-11, -13.75), align=None)
    extrude(amount=BOSS_EXTRUDE9_DEPTH)

    # Sketch42 → Cut-Extrude31 (cut, through all)
    with BuildSketch(Plane(origin=(23, 0, 0), x_dir=(0, 0, -1), z_dir=(1, 0, 0))):
        Polygon((16.25, -24), (27.5, -12.75), (19.545048712, -4.795048712), (8.295048712, -16.045048712), align=None)
    extrude(amount=-CUT_EXTRUDE31_DEPTH, mode=Mode.SUBTRACT)

    # Sketch44 → Cut-Extrude32 (cut, through all)
    with BuildSketch(Plane(origin=(23, 0, 0), x_dir=(0, 0, -1), z_dir=(1, 0, 0))):
        with Locations((27.5, -4.75)):
            Circle(SKETCH44_R)
        with Locations((35.5, -12.75)):
            Circle(SKETCH44_R)
        with Locations((27.5, -20.75)):
            Circle(SKETCH44_R)
    extrude(amount=-CUT_EXTRUDE32_DEPTH, mode=Mode.SUBTRACT)

    # Sketch45 → Cut-Extrude33 (cut)
    # profile 1 of 3: a face of its own
    with BuildSketch(Plane(origin=(23, 0, 0), x_dir=(0, 0, -1), z_dir=(1, 0, 0))):
        with BuildLine():
            Line((25.5, -1.679205087), (25.5, -4.75))
            ThreePointArc((25.5, -4.75), (27.5, -6.75), (29.5, -4.75))
            Line((29.5, -4.75), (29.5, -1.679205087))
            ThreePointArc((29.5, -1.679205087), (27.5, -1.5), (25.5, -1.679205087))
        make_face()
        with Locations((27.5, -4.75)):
            Circle(SKETCH45_R, mode=Mode.SUBTRACT)
    # profile 2 of 3: a face of its own
    with BuildSketch(Plane(origin=(23, 0, 0), x_dir=(0, 0, -1), z_dir=(1, 0, 0))):
        with BuildLine():
            ThreePointArc((38.75, -12.75), (38.705109164, -11.745993717), (38.570794913, -10.75))
            Line((38.570794913, -10.75), (35.5, -10.75))
            ThreePointArc((35.5, -10.75), (33.5, -12.75), (35.5, -14.75))
            Line((35.5, -14.75), (38.75, -14.75))
            Line((38.75, -14.75), (38.75, -12.75))
        make_face()
        with Locations((35.5, -12.75)):
            Circle(SKETCH45_R, mode=Mode.SUBTRACT)
    # profile 3 of 3: a face of its own
    with BuildSketch(Plane(origin=(23, 0, 0), x_dir=(0, 0, -1), z_dir=(1, 0, 0))):
        with BuildLine():
            Line((25.5, -16.5), (25.5, -20.75))
            ThreePointArc((25.5, -20.75), (27.5, -22.75), (29.5, -20.75))
            Line((29.5, -20.75), (29.5, -16.5))
            ThreePointArc((29.5, -16.5), (27.5, -17), (25.5, -16.5))
        make_face()
        with Locations((27.5, -20.75)):
            Circle(SKETCH45_R, mode=Mode.SUBTRACT)
    cut_extrude33 = extrude(amount=-CUT_EXTRUDE33_DEPTH, mode=Mode.SUBTRACT)

    # Mirror4: Cut-Extrude33 across plane
    add(cut_extrude33.mirror(Plane(origin=(0, 0, 0), x_dir=(0, 0, 1), z_dir=(1, 0, 0))), mode=Mode.SUBTRACT)

    # Sketch47 → Cut-Extrude34 (cut, through all)
    with BuildSketch(Plane(origin=(23, 0, 0), x_dir=(0, 0, -1), z_dir=(1, 0, 0))):
        with BuildLine():
            ThreePointArc((25.5, -16.5), (26.469223594, -16.873105626), (27.5, -17))
            Line((27.5, -17), (27.5, -8.5))
            ThreePointArc((27.5, -8.5), (25.873595412, -8.823511987), (24.49479618, -9.74479618))
            ThreePointArc((24.49479618, -9.74479618), (23.25, -12.75), (24.49479618, -15.75520382))
            ThreePointArc((24.49479618, -15.75520382), (24.969842563, -16.164791845), (25.5, -16.5))
        make_face()
        with BuildLine():
            Line((27.5, -8.5), (27.5, -17))
            ThreePointArc((27.5, -17), (28.530776406, -16.873105626), (29.5, -16.5))
            ThreePointArc((29.5, -16.5), (31.144344934, -14.936606961), (31.75, -12.75))
            ThreePointArc((31.75, -12.75), (30.50520382, -9.74479618), (27.5, -8.5))
        make_face()
        with BuildLine():
            Line((17.870481142, -17), (23.25, -17))
            Line((23.25, -17), (24.49479618, -15.75520382))
            ThreePointArc((24.49479618, -15.75520382), (23.25, -12.75), (24.49479618, -9.74479618))
            Line((24.49479618, -9.74479618), (23.25, -8.5))
            Line((23.25, -8.5), (17.870481142, -8.5))
            Line((17.870481142, -8.5), (17.870481142, -17))
        make_face()
        with BuildLine():
            ThreePointArc((24.49479618, -9.74479618), (25.873595412, -8.823511987), (27.5, -8.5))
            Line((27.5, -8.5), (23.25, -8.5))
            Line((23.25, -8.5), (24.49479618, -9.74479618))
        make_face()
        with BuildLine():
            Line((23.25, -17), (25.5, -17))
            Line((25.5, -17), (25.5, -16.5))
            ThreePointArc((25.5, -16.5), (24.969842563, -16.164791845), (24.49479618, -15.75520382))
            Line((24.49479618, -15.75520382), (23.25, -17))
        make_face()
        with BuildLine():
            Line((25.5, -17), (27.5, -17))
            ThreePointArc((27.5, -17), (26.469223594, -16.873105626), (25.5, -16.5))
            Line((25.5, -16.5), (25.5, -17))
        make_face()
    extrude(amount=-CUT_EXTRUDE34_DEPTH, mode=Mode.SUBTRACT)

    # Sketch48 → Cut-Extrude35 (cut, through all)
    with BuildSketch(Plane(origin=(23, 0, 0), x_dir=(0, 0, -1), z_dir=(1, 0, 0))):
        with Locations((9.75, -41.25)):
            Rectangle(SKETCH48_W, SKETCH48_H)
    extrude(amount=-CUT_EXTRUDE35_DEPTH, mode=Mode.SUBTRACT)


solid = part.part
